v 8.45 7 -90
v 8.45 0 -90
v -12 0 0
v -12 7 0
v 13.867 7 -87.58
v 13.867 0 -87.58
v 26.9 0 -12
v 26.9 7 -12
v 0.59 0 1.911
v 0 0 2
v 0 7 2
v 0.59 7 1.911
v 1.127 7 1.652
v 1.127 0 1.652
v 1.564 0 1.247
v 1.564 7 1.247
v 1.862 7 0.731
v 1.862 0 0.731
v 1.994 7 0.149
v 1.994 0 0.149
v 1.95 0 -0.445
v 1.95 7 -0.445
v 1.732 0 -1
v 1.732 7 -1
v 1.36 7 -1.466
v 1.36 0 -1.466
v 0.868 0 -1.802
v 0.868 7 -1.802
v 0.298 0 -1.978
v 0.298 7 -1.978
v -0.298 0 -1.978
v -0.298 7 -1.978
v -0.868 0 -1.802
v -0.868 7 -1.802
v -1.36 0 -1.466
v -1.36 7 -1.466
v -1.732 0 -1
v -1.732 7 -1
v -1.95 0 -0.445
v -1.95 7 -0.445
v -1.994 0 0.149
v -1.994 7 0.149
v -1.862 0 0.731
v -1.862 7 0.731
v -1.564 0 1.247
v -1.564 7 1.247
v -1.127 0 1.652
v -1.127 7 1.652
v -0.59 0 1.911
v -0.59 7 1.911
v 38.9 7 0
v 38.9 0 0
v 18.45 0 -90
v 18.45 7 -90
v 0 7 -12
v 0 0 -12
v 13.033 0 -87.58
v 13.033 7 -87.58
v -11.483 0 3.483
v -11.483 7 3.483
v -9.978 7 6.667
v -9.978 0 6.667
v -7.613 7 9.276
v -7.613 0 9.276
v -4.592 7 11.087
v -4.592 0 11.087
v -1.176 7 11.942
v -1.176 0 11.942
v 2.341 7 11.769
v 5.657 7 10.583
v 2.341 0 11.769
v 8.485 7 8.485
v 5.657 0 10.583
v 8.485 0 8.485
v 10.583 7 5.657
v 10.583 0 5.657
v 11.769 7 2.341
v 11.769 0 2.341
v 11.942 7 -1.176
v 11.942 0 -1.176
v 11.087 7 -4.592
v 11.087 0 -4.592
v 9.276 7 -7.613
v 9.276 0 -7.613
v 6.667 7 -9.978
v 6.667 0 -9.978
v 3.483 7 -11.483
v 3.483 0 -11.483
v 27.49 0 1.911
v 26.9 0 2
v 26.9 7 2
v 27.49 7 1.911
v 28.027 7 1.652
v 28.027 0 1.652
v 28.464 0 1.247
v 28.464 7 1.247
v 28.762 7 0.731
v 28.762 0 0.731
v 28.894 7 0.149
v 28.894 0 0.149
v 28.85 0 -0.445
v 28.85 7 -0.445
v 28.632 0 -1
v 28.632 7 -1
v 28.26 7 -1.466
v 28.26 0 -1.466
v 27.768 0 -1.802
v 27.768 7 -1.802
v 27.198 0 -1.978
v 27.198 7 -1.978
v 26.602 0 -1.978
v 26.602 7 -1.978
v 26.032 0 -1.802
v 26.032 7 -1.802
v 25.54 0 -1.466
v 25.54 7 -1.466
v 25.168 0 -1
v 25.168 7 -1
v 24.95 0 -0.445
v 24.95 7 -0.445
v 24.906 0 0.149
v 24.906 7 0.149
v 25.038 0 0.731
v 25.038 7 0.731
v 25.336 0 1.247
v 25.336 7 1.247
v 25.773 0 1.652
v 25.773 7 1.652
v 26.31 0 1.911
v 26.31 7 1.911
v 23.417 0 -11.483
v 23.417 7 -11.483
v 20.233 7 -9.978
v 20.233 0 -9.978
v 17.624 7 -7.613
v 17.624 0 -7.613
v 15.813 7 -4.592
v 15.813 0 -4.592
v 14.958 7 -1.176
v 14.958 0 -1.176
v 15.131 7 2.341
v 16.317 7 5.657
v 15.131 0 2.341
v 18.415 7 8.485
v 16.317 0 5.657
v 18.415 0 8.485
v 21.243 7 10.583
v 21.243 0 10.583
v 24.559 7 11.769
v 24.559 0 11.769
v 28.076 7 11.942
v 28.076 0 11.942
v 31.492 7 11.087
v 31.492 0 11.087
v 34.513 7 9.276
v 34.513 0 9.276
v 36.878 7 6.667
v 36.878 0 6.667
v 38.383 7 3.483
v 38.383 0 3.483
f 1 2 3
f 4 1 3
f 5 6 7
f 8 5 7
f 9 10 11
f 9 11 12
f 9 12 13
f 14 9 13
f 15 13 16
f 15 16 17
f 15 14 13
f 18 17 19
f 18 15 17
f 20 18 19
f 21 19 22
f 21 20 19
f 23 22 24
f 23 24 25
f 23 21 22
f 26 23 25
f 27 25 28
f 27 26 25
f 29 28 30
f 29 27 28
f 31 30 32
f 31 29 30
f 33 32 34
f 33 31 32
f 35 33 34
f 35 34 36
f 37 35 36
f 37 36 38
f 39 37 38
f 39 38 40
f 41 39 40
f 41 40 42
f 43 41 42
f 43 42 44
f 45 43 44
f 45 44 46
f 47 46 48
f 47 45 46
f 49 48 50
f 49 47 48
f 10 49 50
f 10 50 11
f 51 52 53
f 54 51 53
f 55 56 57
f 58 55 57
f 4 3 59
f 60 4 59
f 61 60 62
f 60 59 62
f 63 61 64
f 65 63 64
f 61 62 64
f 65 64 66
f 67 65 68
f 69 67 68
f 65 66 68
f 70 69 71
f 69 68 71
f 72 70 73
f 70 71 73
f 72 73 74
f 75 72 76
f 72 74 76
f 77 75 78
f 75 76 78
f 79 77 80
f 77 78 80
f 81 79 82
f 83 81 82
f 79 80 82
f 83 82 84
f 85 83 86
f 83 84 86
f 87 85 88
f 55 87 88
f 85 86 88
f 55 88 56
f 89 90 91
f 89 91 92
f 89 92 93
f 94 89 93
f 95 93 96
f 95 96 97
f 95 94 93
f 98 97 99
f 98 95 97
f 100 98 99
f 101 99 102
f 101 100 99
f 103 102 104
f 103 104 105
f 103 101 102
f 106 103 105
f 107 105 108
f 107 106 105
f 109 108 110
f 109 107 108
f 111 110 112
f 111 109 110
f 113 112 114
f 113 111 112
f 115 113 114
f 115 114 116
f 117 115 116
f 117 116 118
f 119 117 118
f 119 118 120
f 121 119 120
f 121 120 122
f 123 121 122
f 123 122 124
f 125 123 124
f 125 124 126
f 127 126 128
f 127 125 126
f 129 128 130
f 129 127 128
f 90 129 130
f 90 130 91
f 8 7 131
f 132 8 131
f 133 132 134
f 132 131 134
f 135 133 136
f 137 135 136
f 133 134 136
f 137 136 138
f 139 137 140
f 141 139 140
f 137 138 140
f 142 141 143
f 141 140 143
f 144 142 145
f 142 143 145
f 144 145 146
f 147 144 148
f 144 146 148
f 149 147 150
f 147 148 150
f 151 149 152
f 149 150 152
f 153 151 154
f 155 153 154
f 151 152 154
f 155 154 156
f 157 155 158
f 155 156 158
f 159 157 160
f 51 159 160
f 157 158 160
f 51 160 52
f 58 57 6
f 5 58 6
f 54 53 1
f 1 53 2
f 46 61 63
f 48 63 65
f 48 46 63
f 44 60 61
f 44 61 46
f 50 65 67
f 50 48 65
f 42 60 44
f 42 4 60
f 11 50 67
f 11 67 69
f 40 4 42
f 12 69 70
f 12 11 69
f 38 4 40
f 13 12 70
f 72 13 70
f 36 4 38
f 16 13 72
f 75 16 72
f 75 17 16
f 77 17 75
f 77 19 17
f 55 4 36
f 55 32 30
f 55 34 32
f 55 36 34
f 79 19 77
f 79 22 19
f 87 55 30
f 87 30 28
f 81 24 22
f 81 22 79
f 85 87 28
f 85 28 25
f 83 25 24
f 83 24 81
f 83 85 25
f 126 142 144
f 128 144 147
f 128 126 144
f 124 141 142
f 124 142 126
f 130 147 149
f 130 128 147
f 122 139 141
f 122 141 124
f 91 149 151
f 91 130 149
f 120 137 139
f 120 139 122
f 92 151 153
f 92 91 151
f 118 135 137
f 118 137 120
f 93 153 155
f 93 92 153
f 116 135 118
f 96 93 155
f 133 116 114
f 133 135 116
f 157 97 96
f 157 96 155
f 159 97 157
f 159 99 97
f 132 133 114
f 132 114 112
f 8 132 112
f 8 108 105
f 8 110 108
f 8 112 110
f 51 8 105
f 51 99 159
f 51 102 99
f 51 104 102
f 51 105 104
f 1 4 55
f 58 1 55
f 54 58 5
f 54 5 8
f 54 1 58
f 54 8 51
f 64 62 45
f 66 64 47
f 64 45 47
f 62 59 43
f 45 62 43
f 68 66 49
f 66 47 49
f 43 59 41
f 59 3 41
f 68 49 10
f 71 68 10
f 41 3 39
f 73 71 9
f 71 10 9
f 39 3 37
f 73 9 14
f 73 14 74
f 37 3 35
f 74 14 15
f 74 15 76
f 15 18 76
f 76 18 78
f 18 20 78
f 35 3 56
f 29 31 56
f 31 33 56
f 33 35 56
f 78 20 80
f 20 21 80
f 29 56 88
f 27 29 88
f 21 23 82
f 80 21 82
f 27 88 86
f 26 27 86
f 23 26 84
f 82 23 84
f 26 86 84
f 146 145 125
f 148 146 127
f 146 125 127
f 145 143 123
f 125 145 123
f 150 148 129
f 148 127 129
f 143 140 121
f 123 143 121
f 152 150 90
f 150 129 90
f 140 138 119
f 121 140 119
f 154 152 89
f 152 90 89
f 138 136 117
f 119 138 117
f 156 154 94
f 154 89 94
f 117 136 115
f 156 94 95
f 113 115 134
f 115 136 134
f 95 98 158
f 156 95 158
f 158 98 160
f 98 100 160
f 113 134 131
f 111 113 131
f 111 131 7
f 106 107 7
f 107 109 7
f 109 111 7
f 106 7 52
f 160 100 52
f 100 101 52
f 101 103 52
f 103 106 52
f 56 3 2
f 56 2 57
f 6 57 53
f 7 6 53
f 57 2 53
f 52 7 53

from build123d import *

# Parameters (mm, degrees)
SKETCH1_R           = 2
BOSS_EXTRUDE1_DEPTH = 7


with BuildPart() as part:
    # Sketch1 → Boss-Extrude1 (new body)
    with BuildSketch(Plane(origin=(0, 0, 0), x_dir=(1, 0, 0), z_dir=(0, 1, 0))):
        with BuildLine():
            Line((13.032630063, 87.579564679), (13.867369937, 87.579564679))
            Line((13.867369937, 87.579564679), (26.9, 12))
            ThreePointArc((26.9, 12), (18.414718626, -8.485281374), (38.9, 0))
            Line((38.9, 0), (18.45, 90))
            Line((18.45, 90), (13.45, 90))
            Line((13.45, 90), (8.45, 90))
            Line((8.45, 90), (-12, 0))
            ThreePointArc((-12, 0), (8.485281374, -8.485281374), (0, 12))
            Line((0, 12), (13.032630063, 87.579564679))
        make_face()
        with Locations(Location((0, 0, 0), (0, 0, 270))):
            Circle(SKETCH1_R, mode=Mode.SUBTRACT)
        with Locations(Location((26.9, 0, 0), (0, 0, 270))):
            Circle(SKETCH1_R, mode=Mode.SUBTRACT)
    extrude(amount=BOSS_EXTRUDE1_DEPTH)


solid = part.part
